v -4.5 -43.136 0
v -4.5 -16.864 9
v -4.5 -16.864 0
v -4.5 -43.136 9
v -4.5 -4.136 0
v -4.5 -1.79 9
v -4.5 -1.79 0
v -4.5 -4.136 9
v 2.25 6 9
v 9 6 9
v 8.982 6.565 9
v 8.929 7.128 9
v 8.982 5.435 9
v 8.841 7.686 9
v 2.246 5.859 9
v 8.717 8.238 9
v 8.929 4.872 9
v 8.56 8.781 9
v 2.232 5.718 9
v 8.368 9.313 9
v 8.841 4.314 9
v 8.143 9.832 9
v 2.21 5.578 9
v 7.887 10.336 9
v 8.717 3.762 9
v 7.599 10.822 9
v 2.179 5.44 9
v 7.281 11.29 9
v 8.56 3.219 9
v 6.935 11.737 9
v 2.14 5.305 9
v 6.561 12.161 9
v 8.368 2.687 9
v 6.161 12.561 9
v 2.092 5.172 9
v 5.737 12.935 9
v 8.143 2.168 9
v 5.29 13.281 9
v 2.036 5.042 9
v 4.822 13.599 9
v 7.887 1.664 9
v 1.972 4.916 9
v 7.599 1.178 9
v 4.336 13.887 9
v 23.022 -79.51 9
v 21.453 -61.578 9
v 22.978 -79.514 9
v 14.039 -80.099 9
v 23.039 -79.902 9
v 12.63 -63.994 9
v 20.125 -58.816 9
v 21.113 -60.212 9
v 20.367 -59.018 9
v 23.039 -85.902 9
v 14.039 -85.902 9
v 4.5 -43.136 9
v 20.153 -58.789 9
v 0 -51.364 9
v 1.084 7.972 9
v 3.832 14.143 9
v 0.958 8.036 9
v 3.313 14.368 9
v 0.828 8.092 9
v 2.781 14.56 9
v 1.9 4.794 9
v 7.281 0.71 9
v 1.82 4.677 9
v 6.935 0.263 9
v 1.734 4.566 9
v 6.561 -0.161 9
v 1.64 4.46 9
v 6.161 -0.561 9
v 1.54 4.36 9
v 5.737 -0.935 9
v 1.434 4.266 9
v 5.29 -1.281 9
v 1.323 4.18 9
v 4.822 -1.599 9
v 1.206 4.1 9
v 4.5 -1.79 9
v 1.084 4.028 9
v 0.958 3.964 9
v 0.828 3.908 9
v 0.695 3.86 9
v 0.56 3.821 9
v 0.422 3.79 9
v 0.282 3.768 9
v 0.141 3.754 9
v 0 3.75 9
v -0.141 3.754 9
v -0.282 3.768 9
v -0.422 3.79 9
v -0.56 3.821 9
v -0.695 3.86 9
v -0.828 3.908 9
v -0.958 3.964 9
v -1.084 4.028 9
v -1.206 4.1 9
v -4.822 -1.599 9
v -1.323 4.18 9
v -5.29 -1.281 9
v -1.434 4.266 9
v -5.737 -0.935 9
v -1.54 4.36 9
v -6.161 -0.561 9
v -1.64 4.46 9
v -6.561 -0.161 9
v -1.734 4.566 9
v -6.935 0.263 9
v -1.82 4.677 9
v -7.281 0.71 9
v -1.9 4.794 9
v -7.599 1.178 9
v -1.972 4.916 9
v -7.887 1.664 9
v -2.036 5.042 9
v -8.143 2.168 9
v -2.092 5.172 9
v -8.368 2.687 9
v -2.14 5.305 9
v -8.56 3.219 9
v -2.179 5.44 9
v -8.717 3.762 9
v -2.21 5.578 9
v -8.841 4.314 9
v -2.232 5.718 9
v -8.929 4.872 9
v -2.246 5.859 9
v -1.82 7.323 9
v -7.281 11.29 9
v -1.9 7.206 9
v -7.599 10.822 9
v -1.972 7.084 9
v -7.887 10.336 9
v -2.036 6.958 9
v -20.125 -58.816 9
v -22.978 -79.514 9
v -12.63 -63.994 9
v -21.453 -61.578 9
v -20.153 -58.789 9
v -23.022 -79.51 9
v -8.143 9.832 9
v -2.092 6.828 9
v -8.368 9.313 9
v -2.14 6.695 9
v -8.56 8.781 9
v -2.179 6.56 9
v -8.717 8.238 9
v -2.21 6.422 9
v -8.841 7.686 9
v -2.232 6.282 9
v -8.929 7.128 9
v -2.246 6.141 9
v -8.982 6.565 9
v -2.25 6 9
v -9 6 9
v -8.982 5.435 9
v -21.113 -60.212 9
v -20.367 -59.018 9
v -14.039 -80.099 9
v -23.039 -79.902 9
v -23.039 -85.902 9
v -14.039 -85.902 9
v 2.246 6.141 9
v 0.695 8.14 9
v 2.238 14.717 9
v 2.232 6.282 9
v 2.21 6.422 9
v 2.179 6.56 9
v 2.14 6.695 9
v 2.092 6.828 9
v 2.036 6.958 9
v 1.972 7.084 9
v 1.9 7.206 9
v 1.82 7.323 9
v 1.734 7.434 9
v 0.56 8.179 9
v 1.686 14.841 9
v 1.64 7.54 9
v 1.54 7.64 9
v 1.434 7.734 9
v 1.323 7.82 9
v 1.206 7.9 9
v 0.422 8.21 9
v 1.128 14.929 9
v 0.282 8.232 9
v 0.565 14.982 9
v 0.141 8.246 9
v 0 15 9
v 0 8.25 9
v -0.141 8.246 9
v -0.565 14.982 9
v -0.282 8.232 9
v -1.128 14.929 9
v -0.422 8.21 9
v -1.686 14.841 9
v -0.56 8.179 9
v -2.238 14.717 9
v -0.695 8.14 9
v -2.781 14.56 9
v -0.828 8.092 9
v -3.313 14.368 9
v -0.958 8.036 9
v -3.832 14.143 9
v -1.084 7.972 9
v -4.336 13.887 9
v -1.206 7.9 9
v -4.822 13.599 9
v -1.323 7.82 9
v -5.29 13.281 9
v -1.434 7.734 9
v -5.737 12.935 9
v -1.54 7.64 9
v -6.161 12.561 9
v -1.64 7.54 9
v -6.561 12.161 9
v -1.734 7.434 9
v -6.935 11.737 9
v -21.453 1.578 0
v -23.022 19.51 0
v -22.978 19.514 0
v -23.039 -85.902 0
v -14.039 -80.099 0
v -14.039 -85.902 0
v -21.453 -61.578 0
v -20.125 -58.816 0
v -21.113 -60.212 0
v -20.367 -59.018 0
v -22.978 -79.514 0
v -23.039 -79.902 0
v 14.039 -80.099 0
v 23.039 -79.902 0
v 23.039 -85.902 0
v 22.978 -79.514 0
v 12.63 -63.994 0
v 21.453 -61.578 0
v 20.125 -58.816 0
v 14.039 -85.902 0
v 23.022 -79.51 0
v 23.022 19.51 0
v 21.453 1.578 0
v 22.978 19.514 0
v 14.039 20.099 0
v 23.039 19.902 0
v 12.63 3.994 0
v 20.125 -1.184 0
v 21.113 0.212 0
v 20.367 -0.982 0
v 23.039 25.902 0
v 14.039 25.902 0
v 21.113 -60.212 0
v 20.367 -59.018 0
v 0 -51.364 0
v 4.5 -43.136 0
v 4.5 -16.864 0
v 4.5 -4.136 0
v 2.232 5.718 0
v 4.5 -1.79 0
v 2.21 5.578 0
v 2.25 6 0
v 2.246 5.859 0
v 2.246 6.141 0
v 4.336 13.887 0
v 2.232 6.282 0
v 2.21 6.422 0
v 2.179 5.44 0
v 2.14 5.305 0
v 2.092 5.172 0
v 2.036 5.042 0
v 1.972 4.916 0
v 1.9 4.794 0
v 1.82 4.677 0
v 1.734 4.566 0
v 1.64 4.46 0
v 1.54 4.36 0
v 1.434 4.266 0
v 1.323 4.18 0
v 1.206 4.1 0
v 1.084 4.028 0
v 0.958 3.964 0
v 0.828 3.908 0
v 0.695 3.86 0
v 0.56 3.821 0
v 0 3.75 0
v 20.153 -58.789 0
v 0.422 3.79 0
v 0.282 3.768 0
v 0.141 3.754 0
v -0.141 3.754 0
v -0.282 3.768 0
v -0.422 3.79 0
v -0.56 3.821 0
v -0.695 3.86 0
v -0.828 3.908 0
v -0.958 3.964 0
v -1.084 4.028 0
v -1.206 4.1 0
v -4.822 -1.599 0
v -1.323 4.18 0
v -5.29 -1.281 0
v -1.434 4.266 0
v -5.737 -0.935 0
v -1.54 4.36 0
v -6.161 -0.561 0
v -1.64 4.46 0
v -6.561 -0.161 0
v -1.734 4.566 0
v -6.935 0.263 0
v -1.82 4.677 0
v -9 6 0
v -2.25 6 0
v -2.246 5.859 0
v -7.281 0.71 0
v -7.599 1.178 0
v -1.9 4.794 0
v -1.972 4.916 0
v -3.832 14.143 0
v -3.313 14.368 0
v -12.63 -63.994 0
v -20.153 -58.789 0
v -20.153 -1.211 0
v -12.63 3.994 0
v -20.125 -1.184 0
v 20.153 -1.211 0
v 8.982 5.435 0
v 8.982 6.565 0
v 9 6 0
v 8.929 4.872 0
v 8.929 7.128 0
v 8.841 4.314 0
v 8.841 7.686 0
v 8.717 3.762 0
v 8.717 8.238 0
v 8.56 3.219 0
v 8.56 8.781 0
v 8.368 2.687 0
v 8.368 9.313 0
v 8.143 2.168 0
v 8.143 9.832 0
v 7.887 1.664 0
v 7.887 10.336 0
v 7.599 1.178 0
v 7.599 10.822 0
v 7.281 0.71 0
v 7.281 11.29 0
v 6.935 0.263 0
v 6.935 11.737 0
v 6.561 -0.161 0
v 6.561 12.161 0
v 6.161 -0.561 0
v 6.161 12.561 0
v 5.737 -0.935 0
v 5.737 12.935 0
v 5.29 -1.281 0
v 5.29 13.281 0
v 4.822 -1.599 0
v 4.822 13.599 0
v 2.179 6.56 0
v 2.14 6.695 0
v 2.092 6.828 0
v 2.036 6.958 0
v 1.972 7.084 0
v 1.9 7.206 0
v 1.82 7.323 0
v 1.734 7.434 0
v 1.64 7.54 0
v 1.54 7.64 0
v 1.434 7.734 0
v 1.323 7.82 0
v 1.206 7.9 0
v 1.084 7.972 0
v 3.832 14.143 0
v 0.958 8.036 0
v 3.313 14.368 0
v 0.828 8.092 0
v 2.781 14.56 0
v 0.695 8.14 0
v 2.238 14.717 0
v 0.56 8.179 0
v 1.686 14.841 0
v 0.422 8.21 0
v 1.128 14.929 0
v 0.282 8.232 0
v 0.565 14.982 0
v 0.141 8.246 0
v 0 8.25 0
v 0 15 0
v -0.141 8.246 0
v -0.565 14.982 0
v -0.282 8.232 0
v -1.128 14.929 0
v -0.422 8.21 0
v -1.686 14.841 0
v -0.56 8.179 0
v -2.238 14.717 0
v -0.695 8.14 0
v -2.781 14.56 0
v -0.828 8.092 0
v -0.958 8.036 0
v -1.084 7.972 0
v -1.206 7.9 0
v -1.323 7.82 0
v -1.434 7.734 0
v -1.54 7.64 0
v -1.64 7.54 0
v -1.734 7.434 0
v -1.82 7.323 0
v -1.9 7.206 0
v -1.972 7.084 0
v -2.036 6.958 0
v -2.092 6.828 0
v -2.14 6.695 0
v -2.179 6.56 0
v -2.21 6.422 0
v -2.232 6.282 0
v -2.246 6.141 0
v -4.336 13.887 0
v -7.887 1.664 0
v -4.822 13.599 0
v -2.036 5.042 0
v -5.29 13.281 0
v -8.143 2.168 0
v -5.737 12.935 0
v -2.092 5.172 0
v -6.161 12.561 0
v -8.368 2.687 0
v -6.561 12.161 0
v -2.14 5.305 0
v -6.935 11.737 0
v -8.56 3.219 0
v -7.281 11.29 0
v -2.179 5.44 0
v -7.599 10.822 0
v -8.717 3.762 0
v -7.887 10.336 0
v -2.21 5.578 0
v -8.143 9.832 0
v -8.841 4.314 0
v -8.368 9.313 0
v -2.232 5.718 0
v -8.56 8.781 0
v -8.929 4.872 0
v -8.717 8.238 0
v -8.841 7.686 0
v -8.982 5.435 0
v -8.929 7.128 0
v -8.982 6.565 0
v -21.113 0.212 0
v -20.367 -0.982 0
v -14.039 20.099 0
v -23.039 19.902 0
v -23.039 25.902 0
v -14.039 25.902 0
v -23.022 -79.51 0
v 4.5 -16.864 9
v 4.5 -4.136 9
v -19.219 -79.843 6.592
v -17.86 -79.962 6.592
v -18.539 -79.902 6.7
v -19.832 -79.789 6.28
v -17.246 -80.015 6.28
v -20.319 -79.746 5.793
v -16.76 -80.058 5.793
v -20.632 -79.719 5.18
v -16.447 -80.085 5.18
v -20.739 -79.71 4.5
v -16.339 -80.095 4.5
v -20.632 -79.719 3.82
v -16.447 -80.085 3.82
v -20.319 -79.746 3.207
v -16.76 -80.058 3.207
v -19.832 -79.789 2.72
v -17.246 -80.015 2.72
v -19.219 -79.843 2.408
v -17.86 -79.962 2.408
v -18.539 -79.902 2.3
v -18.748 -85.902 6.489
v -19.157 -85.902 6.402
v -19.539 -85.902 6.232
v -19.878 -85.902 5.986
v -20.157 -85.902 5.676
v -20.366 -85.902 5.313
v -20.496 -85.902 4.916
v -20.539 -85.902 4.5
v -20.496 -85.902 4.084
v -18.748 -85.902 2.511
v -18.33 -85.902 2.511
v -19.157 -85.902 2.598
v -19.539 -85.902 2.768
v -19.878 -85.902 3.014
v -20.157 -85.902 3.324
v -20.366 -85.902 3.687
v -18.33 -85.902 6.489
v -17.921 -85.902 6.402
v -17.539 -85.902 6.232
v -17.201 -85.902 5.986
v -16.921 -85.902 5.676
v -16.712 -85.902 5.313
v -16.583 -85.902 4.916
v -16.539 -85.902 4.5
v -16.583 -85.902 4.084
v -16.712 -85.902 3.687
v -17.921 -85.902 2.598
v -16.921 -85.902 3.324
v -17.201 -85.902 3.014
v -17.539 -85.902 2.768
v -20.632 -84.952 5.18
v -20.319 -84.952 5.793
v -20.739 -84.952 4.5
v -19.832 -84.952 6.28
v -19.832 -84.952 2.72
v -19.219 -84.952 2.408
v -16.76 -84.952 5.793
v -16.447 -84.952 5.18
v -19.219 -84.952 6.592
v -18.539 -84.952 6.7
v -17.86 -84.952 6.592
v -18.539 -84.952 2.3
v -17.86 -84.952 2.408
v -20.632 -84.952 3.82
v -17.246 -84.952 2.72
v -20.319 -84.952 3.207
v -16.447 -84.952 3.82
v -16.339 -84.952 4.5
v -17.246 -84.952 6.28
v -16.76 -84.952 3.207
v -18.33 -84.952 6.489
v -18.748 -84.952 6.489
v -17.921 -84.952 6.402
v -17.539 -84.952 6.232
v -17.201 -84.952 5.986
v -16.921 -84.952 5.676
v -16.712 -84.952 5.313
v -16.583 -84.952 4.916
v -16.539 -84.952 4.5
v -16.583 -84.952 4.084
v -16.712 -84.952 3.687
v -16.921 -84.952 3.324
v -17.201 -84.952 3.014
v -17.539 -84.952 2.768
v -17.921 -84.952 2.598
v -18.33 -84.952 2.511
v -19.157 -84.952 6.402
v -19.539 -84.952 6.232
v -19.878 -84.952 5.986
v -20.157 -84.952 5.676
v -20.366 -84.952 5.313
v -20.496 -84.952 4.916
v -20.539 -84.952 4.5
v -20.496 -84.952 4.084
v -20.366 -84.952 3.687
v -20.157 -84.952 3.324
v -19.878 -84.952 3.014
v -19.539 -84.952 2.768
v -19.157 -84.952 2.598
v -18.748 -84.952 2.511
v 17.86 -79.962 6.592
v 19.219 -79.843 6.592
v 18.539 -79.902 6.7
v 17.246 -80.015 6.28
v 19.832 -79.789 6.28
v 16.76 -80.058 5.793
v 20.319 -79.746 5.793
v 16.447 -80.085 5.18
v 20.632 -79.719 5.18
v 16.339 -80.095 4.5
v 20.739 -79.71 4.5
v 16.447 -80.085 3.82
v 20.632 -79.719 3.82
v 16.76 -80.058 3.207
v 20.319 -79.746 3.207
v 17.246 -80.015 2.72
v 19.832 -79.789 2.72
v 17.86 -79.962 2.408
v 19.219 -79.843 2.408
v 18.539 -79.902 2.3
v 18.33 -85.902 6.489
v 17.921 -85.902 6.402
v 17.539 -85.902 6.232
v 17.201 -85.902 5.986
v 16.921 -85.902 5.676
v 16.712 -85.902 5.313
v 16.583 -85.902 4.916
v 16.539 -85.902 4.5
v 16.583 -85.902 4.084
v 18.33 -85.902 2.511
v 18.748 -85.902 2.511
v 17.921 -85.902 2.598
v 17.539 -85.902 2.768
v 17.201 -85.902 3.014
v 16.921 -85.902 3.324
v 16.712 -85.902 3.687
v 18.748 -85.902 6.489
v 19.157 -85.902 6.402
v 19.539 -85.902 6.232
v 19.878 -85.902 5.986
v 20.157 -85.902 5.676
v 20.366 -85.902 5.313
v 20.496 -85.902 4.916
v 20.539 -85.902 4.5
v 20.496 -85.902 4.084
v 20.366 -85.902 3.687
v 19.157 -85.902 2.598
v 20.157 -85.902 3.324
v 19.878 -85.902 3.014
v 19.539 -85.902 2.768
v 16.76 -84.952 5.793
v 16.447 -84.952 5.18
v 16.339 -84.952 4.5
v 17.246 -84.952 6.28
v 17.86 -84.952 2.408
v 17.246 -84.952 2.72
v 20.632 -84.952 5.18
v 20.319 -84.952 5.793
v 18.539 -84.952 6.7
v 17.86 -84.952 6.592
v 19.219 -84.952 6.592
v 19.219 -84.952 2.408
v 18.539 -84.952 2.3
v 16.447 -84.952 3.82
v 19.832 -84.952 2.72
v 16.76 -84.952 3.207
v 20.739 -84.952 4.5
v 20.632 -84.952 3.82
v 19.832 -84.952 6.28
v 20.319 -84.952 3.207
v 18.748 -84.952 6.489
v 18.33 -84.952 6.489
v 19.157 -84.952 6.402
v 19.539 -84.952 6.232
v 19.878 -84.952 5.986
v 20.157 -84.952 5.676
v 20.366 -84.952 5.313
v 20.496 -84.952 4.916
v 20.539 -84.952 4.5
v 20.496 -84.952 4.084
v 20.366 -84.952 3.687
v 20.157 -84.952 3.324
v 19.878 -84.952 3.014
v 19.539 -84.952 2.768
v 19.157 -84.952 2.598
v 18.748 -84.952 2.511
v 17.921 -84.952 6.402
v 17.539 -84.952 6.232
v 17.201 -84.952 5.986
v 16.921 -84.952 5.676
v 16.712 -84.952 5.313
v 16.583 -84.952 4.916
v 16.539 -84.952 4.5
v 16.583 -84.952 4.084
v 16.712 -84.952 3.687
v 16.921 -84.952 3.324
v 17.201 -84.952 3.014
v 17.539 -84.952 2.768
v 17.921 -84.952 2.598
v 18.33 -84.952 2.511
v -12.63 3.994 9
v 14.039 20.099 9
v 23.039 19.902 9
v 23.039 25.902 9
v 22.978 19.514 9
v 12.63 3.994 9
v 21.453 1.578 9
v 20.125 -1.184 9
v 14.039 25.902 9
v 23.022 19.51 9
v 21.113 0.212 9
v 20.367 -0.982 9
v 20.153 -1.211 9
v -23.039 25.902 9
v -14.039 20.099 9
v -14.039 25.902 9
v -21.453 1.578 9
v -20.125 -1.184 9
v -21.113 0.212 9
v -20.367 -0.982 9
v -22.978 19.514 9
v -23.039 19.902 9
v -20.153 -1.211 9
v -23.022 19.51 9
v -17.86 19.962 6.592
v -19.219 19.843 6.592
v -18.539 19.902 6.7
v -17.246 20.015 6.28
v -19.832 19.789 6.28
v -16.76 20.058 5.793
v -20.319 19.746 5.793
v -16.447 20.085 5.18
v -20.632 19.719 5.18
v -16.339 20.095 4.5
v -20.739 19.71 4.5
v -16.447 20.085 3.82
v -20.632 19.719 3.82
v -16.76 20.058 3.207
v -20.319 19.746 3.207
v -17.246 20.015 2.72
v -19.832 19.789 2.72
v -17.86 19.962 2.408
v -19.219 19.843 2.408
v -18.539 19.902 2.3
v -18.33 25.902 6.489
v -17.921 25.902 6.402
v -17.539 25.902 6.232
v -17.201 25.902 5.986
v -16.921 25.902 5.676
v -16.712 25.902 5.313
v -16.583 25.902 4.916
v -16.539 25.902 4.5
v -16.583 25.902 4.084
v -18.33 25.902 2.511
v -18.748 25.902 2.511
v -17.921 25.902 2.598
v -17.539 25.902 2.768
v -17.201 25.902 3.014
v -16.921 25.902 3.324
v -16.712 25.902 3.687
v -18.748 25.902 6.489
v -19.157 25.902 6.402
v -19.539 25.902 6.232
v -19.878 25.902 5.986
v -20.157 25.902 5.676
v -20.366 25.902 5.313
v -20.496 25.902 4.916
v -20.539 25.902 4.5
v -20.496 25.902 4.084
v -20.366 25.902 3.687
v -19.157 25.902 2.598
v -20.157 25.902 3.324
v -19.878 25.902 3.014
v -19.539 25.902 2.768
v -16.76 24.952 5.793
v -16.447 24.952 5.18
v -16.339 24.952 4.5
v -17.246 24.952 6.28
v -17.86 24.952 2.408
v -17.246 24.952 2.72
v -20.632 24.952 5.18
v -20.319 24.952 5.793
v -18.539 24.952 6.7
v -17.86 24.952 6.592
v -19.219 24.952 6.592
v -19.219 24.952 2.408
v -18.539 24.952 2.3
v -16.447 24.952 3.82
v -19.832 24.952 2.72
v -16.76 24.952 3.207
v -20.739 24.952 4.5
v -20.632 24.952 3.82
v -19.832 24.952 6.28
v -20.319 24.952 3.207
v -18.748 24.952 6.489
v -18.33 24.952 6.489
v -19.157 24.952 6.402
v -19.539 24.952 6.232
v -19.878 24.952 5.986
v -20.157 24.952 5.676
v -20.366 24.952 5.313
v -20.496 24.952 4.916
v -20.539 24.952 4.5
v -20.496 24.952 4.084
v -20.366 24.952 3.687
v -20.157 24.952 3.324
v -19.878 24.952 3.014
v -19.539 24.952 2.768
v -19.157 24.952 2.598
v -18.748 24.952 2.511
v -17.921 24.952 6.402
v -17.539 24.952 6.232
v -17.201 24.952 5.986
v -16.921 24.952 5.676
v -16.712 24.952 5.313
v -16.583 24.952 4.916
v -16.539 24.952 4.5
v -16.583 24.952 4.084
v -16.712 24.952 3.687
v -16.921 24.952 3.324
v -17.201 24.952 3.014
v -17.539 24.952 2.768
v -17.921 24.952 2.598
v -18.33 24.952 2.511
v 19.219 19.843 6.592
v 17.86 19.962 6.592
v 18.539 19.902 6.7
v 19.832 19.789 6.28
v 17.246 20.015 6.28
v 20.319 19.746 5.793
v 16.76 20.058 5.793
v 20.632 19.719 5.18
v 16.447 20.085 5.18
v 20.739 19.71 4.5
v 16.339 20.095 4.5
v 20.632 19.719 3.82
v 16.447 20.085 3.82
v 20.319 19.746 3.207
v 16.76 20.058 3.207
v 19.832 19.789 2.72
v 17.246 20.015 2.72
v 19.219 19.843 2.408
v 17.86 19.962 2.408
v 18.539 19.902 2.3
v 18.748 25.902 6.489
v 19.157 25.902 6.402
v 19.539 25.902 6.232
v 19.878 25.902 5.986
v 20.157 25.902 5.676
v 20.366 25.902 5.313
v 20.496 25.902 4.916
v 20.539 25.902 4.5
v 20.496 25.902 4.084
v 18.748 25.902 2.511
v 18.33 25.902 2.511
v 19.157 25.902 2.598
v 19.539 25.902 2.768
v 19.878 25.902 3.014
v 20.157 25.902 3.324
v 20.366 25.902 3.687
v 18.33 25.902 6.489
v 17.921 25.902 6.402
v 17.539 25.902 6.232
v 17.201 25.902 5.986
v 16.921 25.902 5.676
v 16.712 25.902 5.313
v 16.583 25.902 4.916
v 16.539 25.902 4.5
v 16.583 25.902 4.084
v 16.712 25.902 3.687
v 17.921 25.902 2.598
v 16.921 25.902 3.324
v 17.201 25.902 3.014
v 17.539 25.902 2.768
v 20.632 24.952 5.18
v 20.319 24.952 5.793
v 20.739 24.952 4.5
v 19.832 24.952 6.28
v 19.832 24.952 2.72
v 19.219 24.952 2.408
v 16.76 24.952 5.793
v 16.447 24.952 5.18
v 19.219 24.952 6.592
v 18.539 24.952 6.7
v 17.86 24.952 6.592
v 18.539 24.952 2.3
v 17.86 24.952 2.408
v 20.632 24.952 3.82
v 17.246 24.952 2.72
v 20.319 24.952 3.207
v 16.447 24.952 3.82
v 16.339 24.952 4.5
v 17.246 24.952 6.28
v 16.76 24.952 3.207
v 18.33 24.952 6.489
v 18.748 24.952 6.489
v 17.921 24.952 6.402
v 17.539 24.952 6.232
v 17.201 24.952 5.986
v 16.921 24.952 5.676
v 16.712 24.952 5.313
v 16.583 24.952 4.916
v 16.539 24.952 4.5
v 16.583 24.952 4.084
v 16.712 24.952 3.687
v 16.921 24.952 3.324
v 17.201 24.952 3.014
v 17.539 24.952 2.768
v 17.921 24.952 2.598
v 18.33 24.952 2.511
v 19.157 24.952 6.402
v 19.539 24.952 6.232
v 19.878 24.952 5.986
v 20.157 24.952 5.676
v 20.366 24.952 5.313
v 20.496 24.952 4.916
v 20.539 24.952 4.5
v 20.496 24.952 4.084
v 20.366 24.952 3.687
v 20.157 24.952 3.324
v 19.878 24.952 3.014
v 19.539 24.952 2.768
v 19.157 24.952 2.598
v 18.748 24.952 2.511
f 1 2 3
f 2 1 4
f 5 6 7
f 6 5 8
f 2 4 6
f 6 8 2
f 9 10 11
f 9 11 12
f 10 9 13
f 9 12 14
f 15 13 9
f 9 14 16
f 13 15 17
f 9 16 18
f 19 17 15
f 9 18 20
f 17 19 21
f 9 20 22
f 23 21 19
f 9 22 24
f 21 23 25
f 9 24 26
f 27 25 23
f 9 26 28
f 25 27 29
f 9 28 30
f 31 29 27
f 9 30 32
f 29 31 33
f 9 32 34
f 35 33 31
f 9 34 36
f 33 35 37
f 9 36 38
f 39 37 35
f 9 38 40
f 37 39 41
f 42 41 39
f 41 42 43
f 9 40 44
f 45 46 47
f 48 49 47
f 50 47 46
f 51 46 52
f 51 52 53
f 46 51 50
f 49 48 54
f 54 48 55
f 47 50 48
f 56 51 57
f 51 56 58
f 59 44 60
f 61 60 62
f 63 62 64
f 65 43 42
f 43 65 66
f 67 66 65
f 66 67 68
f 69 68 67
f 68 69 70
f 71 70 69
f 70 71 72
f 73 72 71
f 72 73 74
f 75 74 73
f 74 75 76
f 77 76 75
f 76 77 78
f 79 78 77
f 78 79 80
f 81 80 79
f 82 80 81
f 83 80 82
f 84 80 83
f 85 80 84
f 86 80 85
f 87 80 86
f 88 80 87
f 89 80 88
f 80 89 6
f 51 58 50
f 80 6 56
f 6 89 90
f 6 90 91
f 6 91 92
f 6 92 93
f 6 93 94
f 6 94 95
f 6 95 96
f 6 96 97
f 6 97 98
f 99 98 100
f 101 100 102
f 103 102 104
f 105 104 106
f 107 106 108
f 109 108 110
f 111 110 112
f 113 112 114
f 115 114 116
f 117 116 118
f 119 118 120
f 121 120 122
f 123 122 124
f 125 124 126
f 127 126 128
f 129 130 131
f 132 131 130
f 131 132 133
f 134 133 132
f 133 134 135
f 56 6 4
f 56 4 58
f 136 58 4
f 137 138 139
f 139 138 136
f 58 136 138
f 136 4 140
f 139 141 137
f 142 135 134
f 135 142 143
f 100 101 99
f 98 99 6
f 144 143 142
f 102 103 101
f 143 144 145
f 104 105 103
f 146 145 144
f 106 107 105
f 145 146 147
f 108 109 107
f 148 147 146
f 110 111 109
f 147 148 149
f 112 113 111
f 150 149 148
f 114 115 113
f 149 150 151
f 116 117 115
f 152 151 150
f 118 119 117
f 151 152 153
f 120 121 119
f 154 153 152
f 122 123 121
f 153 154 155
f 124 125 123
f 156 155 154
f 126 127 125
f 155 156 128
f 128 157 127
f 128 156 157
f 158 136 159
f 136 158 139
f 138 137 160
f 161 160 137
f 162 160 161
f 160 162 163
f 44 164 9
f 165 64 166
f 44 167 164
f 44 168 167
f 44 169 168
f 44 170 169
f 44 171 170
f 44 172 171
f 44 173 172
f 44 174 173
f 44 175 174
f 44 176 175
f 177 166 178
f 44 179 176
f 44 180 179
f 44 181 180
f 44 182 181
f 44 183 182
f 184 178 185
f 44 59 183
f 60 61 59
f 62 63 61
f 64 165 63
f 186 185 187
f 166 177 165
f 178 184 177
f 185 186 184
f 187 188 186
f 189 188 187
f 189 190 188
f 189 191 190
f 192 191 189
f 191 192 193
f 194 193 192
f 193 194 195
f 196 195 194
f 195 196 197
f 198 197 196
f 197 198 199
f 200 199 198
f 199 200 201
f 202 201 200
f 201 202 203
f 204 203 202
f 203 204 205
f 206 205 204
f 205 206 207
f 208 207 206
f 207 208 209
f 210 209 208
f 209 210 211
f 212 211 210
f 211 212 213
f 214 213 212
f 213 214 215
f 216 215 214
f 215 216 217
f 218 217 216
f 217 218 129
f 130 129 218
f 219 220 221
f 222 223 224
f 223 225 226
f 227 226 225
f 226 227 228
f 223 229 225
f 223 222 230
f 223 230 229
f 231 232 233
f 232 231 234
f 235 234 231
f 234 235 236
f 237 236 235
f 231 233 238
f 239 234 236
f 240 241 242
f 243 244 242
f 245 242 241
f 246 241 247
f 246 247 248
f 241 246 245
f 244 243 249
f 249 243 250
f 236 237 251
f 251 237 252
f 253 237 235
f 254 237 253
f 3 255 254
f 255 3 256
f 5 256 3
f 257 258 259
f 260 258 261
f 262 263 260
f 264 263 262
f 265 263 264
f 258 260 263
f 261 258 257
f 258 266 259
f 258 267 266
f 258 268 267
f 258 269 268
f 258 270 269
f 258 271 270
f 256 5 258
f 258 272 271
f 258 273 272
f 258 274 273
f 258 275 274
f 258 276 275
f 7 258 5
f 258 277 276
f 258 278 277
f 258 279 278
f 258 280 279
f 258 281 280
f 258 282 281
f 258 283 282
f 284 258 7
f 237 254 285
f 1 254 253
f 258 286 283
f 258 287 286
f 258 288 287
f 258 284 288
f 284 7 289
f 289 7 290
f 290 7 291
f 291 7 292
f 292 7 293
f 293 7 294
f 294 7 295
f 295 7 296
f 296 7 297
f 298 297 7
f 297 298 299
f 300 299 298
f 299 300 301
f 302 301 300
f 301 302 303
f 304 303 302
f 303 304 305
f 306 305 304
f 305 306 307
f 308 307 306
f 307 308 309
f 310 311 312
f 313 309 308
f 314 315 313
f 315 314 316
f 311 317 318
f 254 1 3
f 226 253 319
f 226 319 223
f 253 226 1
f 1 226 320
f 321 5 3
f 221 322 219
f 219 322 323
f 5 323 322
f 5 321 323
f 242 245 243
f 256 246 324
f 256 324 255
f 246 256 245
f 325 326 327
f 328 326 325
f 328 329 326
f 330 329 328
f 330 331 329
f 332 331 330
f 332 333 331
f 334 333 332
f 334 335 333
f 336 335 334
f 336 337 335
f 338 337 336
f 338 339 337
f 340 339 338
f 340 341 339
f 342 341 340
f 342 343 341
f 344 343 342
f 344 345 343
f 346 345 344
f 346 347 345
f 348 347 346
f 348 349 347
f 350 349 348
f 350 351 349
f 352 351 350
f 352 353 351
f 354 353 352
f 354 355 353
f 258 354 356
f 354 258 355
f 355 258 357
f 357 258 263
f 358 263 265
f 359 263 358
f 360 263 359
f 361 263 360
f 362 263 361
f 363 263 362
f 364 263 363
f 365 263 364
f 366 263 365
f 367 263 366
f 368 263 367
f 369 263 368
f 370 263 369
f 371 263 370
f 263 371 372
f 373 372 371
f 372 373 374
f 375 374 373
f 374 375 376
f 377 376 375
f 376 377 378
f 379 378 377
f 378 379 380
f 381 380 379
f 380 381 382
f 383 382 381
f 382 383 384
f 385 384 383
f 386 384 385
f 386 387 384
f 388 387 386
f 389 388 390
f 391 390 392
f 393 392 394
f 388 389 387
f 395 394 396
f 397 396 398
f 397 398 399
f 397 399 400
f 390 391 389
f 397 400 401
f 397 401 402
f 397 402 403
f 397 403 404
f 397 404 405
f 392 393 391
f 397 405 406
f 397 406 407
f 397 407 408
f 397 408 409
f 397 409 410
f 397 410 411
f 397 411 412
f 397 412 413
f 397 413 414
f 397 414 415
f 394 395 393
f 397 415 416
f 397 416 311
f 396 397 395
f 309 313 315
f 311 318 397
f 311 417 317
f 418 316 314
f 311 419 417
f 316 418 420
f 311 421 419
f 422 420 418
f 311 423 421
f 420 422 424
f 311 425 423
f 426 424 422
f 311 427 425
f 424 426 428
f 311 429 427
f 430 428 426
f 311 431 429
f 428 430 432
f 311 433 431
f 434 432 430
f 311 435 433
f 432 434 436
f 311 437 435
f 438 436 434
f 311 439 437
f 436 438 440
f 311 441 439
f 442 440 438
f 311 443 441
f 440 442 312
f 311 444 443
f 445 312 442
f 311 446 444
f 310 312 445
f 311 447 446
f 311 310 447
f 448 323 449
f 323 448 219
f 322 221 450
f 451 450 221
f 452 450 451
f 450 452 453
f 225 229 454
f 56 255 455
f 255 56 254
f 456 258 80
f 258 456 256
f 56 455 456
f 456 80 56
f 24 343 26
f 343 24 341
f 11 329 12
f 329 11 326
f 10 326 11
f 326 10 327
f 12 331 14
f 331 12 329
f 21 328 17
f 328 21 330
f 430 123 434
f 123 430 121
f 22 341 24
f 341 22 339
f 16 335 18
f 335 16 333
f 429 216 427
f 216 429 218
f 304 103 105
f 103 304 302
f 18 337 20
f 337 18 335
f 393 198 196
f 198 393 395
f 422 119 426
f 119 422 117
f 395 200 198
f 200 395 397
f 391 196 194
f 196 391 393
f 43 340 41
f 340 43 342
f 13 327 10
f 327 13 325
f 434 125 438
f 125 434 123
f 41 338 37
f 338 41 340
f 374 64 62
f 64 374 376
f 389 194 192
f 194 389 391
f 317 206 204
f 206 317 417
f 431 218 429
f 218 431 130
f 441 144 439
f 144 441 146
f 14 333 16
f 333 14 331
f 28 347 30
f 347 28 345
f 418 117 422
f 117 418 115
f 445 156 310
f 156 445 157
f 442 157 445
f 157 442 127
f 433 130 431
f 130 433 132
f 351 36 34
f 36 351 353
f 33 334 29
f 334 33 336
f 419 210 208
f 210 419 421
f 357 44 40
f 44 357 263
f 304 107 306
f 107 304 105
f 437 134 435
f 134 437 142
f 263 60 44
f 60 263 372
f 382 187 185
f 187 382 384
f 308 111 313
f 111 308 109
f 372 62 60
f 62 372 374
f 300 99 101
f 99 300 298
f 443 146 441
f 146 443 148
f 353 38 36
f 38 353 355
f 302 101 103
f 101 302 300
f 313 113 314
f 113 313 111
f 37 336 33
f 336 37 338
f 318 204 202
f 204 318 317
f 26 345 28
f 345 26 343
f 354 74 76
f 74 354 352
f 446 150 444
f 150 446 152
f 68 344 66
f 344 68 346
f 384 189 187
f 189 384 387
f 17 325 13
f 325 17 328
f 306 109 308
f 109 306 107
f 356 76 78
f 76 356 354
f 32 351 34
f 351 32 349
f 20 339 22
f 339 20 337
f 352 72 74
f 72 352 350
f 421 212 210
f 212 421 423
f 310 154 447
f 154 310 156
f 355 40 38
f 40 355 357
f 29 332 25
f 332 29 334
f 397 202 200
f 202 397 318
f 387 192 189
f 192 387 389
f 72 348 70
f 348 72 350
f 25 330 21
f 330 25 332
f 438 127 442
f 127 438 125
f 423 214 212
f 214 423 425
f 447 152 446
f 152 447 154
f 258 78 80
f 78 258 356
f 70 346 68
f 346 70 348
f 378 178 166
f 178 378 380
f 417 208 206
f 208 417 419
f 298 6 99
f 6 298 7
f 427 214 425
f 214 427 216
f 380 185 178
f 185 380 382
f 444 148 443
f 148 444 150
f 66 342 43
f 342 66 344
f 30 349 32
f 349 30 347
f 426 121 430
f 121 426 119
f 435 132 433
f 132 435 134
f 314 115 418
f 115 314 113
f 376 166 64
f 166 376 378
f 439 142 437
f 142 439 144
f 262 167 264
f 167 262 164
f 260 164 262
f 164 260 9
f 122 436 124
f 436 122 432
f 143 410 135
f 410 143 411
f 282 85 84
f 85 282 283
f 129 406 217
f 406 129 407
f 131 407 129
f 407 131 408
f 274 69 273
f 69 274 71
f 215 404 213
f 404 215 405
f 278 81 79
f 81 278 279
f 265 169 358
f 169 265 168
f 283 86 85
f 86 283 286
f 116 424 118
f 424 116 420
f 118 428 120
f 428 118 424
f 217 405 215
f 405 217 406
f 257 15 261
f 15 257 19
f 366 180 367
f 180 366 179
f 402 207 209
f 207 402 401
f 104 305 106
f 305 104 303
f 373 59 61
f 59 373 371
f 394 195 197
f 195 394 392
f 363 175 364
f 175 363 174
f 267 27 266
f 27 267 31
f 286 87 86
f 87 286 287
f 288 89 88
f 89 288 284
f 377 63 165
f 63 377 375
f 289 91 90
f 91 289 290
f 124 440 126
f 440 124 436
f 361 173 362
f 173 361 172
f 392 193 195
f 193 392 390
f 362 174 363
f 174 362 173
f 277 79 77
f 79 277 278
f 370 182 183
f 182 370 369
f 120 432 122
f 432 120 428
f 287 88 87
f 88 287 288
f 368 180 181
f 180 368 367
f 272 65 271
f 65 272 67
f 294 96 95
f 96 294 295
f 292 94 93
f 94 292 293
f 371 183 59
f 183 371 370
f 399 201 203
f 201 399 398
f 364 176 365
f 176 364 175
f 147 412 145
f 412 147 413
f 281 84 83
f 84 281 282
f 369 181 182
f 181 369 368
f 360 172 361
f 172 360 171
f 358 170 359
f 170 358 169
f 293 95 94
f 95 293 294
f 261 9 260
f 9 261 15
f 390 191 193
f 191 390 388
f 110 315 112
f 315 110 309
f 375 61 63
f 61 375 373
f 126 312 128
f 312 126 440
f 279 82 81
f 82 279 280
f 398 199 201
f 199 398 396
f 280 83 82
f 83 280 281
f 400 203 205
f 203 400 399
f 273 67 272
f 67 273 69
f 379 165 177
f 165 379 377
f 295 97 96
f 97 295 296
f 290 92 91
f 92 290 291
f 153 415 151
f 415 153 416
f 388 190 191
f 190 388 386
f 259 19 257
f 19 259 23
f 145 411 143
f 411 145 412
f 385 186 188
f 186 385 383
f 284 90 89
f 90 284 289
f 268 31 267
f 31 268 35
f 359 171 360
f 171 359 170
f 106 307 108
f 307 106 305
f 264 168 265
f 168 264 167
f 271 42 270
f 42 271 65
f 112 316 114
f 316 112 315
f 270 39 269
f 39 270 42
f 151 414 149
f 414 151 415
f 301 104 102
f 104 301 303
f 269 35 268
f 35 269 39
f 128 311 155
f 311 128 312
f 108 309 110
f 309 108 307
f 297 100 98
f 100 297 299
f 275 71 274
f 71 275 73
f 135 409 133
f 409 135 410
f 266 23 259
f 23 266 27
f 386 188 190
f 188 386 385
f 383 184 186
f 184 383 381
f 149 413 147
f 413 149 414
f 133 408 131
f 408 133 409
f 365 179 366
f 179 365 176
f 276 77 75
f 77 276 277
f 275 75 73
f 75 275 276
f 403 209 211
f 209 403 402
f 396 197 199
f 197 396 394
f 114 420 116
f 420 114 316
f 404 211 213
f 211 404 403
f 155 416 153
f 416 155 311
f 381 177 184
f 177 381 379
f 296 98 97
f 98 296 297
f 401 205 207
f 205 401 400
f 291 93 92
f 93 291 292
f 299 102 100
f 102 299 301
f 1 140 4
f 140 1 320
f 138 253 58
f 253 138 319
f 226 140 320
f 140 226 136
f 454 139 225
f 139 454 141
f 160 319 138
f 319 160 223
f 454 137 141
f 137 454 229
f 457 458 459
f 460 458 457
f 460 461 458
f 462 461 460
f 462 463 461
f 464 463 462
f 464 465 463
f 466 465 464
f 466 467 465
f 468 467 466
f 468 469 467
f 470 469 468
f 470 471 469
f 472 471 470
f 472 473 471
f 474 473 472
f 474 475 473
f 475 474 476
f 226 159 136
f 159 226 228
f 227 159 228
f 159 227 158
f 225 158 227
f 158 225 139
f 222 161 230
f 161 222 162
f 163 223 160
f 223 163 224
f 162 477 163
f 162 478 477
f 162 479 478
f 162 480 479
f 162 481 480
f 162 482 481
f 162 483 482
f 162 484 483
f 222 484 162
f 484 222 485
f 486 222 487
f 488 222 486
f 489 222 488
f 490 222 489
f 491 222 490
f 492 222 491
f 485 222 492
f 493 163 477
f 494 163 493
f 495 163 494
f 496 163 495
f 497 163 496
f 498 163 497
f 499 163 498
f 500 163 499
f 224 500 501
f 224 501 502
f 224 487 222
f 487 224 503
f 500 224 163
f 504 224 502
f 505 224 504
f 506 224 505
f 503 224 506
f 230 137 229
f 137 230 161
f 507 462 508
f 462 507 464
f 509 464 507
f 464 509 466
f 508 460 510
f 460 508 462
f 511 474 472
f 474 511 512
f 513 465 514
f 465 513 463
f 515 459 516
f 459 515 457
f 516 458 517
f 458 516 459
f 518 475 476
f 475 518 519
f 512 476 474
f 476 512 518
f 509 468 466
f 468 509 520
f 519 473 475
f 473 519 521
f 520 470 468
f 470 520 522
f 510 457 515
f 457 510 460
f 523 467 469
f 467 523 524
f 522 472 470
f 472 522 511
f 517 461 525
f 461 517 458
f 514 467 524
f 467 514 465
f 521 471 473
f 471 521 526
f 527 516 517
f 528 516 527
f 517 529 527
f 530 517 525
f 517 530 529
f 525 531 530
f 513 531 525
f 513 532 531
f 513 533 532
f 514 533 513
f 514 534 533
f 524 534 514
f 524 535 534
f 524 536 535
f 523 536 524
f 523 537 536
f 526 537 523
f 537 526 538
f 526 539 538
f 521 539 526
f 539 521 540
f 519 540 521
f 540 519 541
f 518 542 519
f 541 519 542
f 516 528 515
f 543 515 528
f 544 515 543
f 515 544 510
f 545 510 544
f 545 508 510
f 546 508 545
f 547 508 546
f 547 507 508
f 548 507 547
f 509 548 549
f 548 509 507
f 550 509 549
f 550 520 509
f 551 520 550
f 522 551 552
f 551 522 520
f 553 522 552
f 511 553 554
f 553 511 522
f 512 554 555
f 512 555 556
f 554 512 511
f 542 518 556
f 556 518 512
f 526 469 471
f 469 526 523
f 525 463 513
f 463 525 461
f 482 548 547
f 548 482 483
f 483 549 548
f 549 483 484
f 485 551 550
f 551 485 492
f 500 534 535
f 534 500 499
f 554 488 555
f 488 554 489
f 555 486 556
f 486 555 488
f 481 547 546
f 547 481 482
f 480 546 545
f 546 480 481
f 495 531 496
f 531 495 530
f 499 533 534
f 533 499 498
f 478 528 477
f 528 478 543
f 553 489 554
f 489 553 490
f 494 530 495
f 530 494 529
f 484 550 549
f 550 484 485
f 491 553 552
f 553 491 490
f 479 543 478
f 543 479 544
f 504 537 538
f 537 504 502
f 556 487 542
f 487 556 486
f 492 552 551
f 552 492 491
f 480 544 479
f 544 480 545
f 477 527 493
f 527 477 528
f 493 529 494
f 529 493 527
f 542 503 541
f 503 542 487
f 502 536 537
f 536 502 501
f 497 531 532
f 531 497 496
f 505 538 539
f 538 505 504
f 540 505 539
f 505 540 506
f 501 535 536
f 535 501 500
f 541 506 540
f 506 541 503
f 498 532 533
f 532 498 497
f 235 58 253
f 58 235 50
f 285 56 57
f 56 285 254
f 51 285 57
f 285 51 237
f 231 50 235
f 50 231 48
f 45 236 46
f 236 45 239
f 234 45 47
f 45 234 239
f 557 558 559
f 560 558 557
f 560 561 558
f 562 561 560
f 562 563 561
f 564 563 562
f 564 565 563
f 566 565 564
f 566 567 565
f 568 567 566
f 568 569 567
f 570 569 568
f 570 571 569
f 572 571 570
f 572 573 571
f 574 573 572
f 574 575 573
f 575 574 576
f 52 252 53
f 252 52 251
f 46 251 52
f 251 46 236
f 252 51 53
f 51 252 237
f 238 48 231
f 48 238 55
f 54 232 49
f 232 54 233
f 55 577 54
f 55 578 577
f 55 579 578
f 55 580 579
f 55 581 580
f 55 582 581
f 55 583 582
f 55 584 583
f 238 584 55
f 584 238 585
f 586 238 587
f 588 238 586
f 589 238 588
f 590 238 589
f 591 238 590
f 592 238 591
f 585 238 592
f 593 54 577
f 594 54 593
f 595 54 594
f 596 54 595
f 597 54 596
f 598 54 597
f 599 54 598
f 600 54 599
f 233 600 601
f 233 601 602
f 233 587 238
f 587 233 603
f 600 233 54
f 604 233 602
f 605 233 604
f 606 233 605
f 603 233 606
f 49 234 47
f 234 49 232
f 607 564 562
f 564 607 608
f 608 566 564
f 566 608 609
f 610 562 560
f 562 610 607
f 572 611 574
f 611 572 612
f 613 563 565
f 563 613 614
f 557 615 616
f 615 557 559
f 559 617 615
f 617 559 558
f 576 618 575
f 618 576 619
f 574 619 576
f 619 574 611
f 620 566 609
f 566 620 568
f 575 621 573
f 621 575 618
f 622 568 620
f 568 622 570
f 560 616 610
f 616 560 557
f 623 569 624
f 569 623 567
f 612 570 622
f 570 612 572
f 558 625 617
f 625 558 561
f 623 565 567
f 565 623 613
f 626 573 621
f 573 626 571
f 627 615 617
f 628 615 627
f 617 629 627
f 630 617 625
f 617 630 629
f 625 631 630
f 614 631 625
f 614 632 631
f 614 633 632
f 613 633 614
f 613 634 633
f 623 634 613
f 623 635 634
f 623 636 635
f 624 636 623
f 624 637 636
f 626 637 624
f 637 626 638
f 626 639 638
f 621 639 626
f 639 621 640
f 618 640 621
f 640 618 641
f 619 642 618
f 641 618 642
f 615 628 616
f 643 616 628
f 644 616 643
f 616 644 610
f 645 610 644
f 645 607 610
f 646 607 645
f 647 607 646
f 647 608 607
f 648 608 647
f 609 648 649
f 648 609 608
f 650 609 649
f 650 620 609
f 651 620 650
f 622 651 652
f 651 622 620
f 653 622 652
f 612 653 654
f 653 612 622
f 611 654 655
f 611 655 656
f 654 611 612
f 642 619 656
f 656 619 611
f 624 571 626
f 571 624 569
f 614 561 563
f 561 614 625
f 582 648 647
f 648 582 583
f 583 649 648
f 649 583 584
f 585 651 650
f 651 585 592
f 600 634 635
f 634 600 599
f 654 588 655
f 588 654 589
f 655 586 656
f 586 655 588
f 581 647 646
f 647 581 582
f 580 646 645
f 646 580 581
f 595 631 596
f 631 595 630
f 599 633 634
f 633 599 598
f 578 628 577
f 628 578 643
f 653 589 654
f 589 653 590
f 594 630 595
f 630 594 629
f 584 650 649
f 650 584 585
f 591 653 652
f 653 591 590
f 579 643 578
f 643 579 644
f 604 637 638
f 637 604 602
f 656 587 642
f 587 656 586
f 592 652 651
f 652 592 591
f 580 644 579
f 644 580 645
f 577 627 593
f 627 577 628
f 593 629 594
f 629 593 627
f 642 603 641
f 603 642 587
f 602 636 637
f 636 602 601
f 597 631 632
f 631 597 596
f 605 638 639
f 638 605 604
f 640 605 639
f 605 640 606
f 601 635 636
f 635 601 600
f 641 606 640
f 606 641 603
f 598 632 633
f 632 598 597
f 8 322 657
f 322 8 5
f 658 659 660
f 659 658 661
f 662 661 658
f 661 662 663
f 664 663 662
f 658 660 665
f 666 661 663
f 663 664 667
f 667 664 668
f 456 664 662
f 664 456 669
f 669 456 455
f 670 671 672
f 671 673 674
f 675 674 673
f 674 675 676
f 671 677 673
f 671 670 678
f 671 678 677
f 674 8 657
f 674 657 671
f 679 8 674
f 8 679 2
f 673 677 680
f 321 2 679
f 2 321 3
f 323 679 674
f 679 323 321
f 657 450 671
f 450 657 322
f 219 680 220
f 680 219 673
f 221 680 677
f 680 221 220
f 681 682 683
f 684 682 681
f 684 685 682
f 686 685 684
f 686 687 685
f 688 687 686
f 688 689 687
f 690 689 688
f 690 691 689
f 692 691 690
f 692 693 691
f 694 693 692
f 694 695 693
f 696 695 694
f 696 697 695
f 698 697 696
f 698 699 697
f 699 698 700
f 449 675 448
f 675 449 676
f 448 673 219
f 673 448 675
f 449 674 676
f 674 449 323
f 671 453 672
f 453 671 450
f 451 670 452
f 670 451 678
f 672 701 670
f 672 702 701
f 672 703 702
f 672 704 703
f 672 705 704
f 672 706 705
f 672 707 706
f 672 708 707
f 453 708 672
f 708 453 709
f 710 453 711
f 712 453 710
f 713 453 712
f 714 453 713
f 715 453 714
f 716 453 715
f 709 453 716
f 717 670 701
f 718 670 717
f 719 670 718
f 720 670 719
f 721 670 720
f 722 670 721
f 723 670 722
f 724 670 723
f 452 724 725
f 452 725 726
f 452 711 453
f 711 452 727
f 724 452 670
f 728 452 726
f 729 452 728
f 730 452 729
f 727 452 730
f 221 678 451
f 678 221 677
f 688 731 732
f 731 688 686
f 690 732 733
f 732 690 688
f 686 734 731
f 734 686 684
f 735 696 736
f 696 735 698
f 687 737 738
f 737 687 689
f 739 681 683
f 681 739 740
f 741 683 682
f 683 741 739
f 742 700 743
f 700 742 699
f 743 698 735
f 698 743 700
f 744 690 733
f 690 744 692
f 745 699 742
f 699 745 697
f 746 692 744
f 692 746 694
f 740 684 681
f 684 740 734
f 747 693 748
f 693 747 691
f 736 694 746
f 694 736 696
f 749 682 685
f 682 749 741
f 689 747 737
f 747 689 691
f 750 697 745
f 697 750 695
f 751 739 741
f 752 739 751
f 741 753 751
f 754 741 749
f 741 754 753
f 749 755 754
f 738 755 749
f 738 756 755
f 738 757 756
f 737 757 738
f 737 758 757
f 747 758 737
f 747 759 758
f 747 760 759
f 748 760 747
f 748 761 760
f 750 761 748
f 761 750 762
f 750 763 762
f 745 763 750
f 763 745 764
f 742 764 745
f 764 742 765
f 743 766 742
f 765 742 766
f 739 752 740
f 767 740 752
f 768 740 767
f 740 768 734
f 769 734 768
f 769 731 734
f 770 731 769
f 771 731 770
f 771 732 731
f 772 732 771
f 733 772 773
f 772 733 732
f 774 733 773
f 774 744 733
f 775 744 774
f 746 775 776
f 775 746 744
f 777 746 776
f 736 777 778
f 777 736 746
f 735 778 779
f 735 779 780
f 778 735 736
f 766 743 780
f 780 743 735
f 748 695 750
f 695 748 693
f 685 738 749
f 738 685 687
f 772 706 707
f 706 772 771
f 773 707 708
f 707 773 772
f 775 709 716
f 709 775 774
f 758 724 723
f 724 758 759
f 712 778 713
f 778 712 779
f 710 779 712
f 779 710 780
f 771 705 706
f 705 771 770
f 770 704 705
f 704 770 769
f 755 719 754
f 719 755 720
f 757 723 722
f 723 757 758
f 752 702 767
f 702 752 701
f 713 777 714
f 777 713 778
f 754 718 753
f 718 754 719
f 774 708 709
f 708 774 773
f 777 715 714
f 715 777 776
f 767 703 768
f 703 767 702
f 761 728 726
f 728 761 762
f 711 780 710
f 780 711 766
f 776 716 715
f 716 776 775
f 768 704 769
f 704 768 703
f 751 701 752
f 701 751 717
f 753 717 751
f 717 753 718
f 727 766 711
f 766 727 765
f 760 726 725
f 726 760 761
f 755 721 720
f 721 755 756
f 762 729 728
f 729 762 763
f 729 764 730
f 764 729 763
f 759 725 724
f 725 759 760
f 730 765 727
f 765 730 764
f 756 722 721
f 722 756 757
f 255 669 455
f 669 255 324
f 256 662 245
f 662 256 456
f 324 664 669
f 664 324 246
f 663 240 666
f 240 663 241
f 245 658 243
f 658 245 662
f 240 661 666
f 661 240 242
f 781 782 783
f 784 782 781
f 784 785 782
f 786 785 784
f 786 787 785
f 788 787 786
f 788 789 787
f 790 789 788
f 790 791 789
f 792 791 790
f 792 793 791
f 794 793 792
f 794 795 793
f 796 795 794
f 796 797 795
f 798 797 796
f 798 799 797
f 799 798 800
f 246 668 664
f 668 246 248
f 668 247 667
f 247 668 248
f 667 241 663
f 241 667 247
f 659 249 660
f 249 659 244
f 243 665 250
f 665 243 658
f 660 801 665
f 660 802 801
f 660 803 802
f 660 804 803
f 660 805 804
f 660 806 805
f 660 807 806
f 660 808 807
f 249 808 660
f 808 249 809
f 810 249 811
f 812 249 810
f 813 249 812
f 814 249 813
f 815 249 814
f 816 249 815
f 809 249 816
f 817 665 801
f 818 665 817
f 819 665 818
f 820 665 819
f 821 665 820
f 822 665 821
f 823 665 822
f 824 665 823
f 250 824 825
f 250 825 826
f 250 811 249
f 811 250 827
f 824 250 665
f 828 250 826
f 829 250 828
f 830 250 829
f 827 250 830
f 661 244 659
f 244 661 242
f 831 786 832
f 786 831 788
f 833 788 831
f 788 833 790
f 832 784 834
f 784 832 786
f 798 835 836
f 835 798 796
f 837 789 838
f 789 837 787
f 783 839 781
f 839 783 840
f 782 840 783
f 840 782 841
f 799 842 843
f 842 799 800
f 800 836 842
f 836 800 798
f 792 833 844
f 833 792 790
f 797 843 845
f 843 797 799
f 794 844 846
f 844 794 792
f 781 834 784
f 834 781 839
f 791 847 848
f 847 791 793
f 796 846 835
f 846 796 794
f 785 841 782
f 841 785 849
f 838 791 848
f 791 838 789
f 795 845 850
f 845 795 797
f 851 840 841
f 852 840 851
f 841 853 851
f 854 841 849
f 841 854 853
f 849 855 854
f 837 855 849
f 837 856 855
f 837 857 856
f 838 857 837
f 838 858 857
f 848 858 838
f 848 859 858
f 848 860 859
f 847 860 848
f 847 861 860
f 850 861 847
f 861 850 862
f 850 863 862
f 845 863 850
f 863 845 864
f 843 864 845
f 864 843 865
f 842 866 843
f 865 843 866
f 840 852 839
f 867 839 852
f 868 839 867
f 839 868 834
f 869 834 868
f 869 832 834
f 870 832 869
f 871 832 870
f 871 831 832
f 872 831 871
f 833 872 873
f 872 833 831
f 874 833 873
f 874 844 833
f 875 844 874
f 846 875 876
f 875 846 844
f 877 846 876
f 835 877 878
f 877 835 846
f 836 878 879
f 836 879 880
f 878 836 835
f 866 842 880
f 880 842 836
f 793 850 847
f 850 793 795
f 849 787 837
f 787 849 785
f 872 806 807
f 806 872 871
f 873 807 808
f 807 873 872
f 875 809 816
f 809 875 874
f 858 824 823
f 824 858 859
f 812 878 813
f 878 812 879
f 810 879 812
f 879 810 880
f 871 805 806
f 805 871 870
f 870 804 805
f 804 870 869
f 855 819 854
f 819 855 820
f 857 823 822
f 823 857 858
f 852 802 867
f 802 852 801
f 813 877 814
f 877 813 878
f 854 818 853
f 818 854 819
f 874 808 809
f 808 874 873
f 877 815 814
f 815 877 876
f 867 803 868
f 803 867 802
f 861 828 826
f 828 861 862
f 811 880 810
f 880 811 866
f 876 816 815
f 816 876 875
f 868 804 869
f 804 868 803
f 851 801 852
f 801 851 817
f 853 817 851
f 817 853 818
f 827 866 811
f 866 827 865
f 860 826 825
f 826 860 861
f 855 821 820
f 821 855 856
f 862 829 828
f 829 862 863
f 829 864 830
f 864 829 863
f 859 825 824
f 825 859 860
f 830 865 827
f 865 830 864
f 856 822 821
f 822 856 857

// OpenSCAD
// ==================================================
// Stick Man - Customizer
// Created by Daiju Watanbe ( Daizyu ).
// 2 April 2016. 
// =================================================

/* MODIFIED VERSION BY Daniel K. Schneider
   January 2017
   - removed base
   - changed default parameters
   - added holes in feet and hands to insert 5x5mm cylindrical magnets
   
   Tips: 
   - The sum of each arm or foot limb angles should be 180.
   - Magnet diameter should be a bit smaller than the magnet if printed with TPE
   - magnet_entry_extra_width = -0.6; and magnet_entry_extra_height = 1; // add a bottle neck
   - Set the magnet_entry_extra_* values to zero if you plan to glue the magnet.
*/

// preview[view:south, tilt:top]

/* [Angle] */
upper_arm_l = -135;               // [-360:360]
lower_arm_l = -40;               // [-360:360]
hand_l = -5;               // [-360:360]
upper_arm_r = 135;               // [-360:360]
lower_arm_r = 40;               // [-360:360]
hand_r = 5;               // [-360:360]
thigh_l = -45;               // [-360:360]
shin_l = 40;               // [-360:360]
foot_l = 5;               // [-360:360]
thigh_r = 45;               // [-360:360]
shin_r = -40;               // [-360:360]
foot_r = -5;               // [-360:360]
body = 0;               // [-360:360]

/* [Basic] */
b_thickness = 9;
thickness = 9;

/* [Magnet holes] */
magnet_diameter = 4.4;
magnet_entry_extra_width = -0.4; // [-1:0]
magnet_entry_extra_height = 1; // [0:1]
magnet_height = 5; // [1:5]

/* [Head] */
fill_head = false;
head_diameter = 18;
head_offset_x = 0;
head_offset_y = 6;
head_hole_diameter = 4.5;

/* [Body] */
body_length = 36;

/* [Heart] */
heart_diameter = 0;
heart_offset_y = 0;

/* [Left arm] */
arm_l_offset = 6;
upper_arm_l_length = 24;
lower_arm_l_length = 18;
hand_l_length = 6;

/* [Right arm] */
arm_r_offset = 6;
upper_arm_r_length = 24;
lower_arm_r_length = 18;
hand_r_length = 6;

/* [Left Leg] */
thigh_l_length = 24;
shin_l_length = 18;
foot_l_length = 6;

/* [Right Leg] */
thigh_r_length = 24;
shin_r_length = 18;
foot_r_length = 6;

/* [Legs and hands] */
paw_extra_width = 0;
paw_extra_height = 0;

/* [resolution] */
base_fn = 120;
head_fn = 100;

module bone(length){
     {
	  translate([-thickness/2,0,0])
	       cube(size = [thickness,length,b_thickness], center = false);
     }
     cylinder(h=b_thickness, r=thickness/2, center=false ,$fn=20);
}

module handFootBone(length){
     {
	  difference () {
	       union () {
		    translate([-(thickness+paw_extra_width)/2,0,0])
			 cube(size = [thickness+paw_extra_width,length,b_thickness+paw_extra_width], center = false);
		    cylinder(h=b_thickness+paw_extra_width, r=(thickness+paw_extra_width)/2, center=false ,$fn=20);
	       }
	       // magnet hole
	       translate ([0,length-magnet_entry_extra_height+0.05,(b_thickness+paw_extra_width)/2])
		    rotate ([90,0,0])
		    cylinder(h=magnet_height+0.5, r=magnet_diameter/2, center=false ,$fn=20);
               // bottleneck at entry
	       translate ([0,length+0.05,(b_thickness+paw_extra_width)/2])
		    rotate ([90,0,0])
		    cylinder(h=magnet_entry_extra_height+0.05, r=(magnet_diameter + magnet_entry_extra_width)/2, center=false ,$fn=30);
	  }
     }
}

module branch(
     head_diameter,
     Degrees1,Length1,
     Degrees2,length2,
     Degrees3,length3,
     Degrees4,length4,
     )
{
     rotate(Degrees1,[0,0,1])
	  translate([0,Length1+head_diameter/2,0])
	  rotate(Degrees2,[0,0,1])
     {
	  bone(length2);

	  translate([0,length2,0])
	       rotate(Degrees3,[0,0,1])
	  {
	       bone(length3);

	       translate([0,length3,0])
		    rotate(Degrees4,[0,0,1])
	       {
		    handFootBone(length4);
	       }
	  }
     }
}

module headBody() {
     union(){
	  translate([head_offset_x,head_offset_y,0])
	       cylinder(h=b_thickness, r=head_diameter/2.0, center=false ,$fn=head_fn);
	  rotate(body+180,[0,0,1])
	       bone(body_length+head_diameter/2);	
     }
}



difference ()
{

     union()
     {
	  if ( fill_head ) 
	  {
	       headBody();
	  }else{
	       difference()
	       {
		    headBody();
		    translate([head_offset_x,head_offset_y,-1])
			 #cylinder(h=b_thickness+2, r=head_hole_diameter/2, center=false ,$fn=head_fn);
			 }
	  }
     
	  branch(head_diameter,
		 body+180,body_length,
		 thigh_l,thigh_l_length,
		 shin_l,shin_l_length,
		 foot_l,foot_l_length
	       );
     
	  branch(head_diameter,
		 body+180,body_length,
		 thigh_r,thigh_r_length,
		 shin_r,shin_r_length,
		 foot_r,foot_r_length
	       );

	  branch(head_diameter,
		 body+180,arm_l_offset,
		 upper_arm_l,upper_arm_l_length,
		 lower_arm_l,lower_arm_l_length,
		 hand_l,hand_l_length
	       );

	  branch(head_diameter,
		 body+180,arm_r_offset,
		 upper_arm_r,upper_arm_r_length,
		 lower_arm_r,lower_arm_r_length,
		 hand_r,hand_r_length
	       );
     }
     translate([0,-body_length/2-heart_offset_y,-1])
	  # cylinder(h=b_thickness+2, r=heart_diameter/2, center=false ,$fn=head_fn);
	  }
